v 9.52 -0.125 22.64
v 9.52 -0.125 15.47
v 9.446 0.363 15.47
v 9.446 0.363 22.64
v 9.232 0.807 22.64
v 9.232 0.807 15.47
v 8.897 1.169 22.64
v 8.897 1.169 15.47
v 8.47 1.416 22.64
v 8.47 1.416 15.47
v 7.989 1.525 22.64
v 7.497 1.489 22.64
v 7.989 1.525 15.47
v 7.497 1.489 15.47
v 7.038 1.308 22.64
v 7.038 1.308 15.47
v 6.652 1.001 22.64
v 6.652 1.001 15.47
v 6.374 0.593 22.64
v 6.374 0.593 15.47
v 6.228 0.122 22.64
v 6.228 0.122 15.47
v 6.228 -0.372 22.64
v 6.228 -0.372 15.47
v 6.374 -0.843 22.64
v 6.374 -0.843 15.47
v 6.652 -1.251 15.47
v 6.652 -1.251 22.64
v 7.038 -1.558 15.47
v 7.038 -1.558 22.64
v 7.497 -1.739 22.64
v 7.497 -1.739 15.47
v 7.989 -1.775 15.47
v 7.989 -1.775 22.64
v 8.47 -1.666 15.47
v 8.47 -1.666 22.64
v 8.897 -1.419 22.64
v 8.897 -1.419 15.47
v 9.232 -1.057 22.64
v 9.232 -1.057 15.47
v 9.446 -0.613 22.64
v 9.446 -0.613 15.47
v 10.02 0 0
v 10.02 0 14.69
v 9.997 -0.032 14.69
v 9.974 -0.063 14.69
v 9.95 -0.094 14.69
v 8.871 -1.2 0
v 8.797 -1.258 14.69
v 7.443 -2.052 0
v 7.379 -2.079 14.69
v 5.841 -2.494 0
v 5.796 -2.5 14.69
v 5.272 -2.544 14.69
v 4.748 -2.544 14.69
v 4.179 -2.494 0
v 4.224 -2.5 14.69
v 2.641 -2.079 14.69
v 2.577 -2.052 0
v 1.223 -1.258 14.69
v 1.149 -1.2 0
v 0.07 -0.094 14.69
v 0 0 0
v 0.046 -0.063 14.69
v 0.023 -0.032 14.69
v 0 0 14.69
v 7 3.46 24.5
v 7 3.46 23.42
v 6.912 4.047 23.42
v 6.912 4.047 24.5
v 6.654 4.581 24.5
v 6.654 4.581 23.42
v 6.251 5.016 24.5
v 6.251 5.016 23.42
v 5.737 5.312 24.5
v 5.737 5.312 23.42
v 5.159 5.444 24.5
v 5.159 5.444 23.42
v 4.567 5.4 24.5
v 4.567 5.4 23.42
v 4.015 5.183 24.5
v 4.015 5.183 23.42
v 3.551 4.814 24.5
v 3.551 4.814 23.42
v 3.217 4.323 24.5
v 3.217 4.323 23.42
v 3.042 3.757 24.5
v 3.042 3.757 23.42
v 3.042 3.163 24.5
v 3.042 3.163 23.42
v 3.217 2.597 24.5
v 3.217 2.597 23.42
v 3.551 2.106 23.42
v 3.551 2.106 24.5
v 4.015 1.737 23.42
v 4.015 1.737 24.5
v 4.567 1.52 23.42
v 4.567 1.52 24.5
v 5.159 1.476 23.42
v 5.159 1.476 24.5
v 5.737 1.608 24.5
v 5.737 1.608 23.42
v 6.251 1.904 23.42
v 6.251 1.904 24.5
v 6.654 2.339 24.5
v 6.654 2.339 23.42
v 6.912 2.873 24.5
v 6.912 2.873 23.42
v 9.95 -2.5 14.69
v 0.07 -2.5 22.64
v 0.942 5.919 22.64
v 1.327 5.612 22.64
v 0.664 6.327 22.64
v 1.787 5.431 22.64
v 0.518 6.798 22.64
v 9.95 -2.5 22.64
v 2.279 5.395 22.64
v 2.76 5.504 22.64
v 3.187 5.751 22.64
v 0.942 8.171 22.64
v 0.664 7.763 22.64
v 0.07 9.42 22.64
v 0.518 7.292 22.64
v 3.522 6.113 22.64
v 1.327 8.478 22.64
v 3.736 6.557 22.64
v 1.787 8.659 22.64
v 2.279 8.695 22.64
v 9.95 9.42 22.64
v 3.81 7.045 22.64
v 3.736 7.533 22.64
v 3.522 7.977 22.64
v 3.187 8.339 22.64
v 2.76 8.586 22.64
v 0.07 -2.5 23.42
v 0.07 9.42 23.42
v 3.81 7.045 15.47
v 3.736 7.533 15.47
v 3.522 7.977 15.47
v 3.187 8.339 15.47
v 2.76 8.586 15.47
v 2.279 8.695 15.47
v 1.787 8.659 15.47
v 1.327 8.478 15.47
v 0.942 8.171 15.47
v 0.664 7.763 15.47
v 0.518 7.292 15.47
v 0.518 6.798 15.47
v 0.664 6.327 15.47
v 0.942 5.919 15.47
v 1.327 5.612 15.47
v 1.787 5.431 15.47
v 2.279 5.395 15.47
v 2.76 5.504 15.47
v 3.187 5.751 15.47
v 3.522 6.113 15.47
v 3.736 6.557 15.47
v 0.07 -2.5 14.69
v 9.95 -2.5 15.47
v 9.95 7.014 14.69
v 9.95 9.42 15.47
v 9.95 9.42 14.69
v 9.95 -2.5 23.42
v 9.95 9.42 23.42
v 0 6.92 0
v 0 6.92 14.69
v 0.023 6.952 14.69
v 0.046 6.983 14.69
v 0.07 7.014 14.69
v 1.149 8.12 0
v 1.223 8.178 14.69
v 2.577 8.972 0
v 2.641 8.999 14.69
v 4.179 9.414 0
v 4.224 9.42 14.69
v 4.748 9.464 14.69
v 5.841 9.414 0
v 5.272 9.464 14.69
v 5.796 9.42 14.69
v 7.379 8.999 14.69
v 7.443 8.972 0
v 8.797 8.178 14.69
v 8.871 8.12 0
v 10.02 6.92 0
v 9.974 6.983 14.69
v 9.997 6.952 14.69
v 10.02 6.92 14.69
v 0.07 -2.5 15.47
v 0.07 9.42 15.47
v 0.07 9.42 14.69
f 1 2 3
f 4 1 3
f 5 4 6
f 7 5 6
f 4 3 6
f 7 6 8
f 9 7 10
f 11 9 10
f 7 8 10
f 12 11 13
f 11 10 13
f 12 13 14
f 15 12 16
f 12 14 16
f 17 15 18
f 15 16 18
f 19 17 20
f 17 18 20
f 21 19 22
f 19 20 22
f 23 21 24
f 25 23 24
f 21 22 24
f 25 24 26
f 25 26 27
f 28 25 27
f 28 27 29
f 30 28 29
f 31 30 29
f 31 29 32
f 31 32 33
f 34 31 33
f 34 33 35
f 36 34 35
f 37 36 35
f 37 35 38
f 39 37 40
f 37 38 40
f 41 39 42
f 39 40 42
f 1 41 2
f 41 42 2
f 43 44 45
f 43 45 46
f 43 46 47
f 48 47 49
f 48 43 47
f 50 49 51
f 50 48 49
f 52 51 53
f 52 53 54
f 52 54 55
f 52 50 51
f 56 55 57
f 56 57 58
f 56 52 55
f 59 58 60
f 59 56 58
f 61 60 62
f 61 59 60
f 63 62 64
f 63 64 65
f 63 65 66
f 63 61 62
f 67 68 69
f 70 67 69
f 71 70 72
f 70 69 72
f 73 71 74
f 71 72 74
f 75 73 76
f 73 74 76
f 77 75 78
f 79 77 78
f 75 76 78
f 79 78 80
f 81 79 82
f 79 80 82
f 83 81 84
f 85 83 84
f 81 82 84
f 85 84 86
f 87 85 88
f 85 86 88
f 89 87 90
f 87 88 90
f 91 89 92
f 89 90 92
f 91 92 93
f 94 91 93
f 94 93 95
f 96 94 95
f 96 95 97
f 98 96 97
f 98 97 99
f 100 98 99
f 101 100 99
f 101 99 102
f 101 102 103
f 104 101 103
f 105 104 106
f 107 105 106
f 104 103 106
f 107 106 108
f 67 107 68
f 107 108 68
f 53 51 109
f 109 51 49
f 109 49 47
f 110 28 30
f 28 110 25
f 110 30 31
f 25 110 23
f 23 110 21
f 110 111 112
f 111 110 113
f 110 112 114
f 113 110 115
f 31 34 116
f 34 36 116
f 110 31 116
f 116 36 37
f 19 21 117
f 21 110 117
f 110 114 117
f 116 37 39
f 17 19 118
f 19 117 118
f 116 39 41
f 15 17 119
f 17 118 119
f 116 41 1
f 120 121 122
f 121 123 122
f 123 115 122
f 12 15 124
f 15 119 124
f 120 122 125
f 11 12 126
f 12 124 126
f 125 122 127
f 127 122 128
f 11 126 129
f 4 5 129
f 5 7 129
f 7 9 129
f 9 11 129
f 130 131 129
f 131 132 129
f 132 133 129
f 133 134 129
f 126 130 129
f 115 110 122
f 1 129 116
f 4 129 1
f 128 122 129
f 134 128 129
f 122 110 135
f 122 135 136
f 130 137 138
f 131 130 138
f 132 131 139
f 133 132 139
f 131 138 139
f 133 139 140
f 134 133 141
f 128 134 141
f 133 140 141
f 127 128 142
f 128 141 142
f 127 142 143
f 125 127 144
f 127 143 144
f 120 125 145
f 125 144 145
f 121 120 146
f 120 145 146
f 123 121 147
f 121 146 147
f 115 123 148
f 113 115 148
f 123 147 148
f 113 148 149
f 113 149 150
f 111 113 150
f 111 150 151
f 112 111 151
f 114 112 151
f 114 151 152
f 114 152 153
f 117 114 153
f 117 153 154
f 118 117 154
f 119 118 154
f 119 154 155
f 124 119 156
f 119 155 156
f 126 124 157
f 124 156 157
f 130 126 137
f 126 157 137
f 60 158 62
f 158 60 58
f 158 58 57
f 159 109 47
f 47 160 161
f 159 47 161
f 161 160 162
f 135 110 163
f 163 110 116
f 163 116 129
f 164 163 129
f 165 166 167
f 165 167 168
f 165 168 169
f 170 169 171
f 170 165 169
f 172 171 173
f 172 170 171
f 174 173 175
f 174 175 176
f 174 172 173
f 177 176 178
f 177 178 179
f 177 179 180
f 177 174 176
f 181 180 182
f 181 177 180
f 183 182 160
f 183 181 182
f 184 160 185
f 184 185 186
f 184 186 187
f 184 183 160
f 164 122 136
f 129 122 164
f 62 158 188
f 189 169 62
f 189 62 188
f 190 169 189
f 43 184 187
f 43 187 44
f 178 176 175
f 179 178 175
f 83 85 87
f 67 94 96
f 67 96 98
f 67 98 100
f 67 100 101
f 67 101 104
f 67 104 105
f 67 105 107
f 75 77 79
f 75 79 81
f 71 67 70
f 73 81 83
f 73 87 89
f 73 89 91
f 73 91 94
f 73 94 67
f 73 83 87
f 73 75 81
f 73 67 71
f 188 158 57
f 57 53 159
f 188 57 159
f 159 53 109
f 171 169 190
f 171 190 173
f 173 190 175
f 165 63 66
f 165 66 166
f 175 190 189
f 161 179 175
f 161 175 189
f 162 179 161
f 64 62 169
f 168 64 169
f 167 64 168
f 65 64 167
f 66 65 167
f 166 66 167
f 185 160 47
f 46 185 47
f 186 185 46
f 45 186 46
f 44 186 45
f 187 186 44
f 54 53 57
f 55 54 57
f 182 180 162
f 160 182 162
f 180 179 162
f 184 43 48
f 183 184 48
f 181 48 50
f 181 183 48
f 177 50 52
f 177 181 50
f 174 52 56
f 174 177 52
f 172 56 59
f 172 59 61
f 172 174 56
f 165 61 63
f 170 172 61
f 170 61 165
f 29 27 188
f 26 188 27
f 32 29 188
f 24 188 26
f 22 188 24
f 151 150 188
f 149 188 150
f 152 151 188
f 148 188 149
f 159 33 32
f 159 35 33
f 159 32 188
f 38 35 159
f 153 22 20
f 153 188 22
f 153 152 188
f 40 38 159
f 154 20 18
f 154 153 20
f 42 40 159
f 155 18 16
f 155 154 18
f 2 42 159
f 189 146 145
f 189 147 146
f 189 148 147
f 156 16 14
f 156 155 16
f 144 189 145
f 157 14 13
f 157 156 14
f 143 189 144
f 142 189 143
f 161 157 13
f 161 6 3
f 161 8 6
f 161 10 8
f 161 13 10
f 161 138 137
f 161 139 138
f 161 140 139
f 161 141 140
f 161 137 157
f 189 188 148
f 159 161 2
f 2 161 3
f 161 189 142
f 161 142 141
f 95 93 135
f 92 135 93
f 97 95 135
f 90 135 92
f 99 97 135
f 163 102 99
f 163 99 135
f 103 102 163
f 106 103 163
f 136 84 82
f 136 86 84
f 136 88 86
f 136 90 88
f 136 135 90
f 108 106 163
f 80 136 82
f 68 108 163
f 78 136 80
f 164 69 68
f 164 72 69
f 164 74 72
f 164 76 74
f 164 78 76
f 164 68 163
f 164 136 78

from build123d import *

# Parameters (mm, degrees)
BOSS_EXTRU_2_DEPTH = 14.69
ESQUISSE2_W        = 9.88
ESQUISSE2_H        = 11.92
BOSS_EXTRU_3_DEPTH = 0.78
ESQUISSE3_R        = 1.655
BOSS_EXTRU_4_DEPTH = 7.17
ESQUISSE4_W        = 9.88
ESQUISSE4_H        = 11.92
BOSS_EXTRU_5_DEPTH = 0.78
ESQUISSE5_R        = 1.99
BOSS_EXTRU_6_DEPTH = 1.08


with BuildPart() as part:
    # Esquisse1 → Boss.-Extru.2 (new body)
    with BuildSketch(Plane.XY):
        with BuildLine():
            Line((0, 0), (0, 6.92))
            ThreePointArc((0, 6.92), (5.01, 9.47), (10.02, 6.92))
            Line((10.02, 6.92), (10.02, 0))
            ThreePointArc((10.02, 0), (5.01, -2.55), (0, 0))
        make_face()
    extrude(amount=BOSS_EXTRU_2_DEPTH)

    # Esquisse2 → Boss.-Extru.3 (add)
    with BuildSketch(Plane.XY.offset(14.69)):
        with Locations((5.01, 3.46)):
            Rectangle(ESQUISSE2_W, ESQUISSE2_H)
    extrude(amount=BOSS_EXTRU_3_DEPTH)

    # Esquisse3 → Boss.-Extru.4 (add)
    with BuildSketch(Plane.XY.offset(15.47)):
        with Locations((7.865, -0.125)):
            Circle(ESQUISSE3_R)
        with Locations((2.155, 7.045)):
            Circle(ESQUISSE3_R)
    extrude(amount=BOSS_EXTRU_4_DEPTH)

    # Esquisse4 → Boss.-Extru.5 (add)
    with BuildSketch(Plane.XY.offset(22.64)):
        with Locations((5.01, 3.46)):
            Rectangle(ESQUISSE4_W, ESQUISSE4_H)
    extrude(amount=BOSS_EXTRU_5_DEPTH)

    # Esquisse5 → Boss.-Extru.6 (add)
    with BuildSketch(Plane.XY.offset(23.42)):
        with Locations((5.01, 3.46)):
            Circle(ESQUISSE5_R)
    extrude(amount=BOSS_EXTRU_6_DEPTH)


solid = part.part
